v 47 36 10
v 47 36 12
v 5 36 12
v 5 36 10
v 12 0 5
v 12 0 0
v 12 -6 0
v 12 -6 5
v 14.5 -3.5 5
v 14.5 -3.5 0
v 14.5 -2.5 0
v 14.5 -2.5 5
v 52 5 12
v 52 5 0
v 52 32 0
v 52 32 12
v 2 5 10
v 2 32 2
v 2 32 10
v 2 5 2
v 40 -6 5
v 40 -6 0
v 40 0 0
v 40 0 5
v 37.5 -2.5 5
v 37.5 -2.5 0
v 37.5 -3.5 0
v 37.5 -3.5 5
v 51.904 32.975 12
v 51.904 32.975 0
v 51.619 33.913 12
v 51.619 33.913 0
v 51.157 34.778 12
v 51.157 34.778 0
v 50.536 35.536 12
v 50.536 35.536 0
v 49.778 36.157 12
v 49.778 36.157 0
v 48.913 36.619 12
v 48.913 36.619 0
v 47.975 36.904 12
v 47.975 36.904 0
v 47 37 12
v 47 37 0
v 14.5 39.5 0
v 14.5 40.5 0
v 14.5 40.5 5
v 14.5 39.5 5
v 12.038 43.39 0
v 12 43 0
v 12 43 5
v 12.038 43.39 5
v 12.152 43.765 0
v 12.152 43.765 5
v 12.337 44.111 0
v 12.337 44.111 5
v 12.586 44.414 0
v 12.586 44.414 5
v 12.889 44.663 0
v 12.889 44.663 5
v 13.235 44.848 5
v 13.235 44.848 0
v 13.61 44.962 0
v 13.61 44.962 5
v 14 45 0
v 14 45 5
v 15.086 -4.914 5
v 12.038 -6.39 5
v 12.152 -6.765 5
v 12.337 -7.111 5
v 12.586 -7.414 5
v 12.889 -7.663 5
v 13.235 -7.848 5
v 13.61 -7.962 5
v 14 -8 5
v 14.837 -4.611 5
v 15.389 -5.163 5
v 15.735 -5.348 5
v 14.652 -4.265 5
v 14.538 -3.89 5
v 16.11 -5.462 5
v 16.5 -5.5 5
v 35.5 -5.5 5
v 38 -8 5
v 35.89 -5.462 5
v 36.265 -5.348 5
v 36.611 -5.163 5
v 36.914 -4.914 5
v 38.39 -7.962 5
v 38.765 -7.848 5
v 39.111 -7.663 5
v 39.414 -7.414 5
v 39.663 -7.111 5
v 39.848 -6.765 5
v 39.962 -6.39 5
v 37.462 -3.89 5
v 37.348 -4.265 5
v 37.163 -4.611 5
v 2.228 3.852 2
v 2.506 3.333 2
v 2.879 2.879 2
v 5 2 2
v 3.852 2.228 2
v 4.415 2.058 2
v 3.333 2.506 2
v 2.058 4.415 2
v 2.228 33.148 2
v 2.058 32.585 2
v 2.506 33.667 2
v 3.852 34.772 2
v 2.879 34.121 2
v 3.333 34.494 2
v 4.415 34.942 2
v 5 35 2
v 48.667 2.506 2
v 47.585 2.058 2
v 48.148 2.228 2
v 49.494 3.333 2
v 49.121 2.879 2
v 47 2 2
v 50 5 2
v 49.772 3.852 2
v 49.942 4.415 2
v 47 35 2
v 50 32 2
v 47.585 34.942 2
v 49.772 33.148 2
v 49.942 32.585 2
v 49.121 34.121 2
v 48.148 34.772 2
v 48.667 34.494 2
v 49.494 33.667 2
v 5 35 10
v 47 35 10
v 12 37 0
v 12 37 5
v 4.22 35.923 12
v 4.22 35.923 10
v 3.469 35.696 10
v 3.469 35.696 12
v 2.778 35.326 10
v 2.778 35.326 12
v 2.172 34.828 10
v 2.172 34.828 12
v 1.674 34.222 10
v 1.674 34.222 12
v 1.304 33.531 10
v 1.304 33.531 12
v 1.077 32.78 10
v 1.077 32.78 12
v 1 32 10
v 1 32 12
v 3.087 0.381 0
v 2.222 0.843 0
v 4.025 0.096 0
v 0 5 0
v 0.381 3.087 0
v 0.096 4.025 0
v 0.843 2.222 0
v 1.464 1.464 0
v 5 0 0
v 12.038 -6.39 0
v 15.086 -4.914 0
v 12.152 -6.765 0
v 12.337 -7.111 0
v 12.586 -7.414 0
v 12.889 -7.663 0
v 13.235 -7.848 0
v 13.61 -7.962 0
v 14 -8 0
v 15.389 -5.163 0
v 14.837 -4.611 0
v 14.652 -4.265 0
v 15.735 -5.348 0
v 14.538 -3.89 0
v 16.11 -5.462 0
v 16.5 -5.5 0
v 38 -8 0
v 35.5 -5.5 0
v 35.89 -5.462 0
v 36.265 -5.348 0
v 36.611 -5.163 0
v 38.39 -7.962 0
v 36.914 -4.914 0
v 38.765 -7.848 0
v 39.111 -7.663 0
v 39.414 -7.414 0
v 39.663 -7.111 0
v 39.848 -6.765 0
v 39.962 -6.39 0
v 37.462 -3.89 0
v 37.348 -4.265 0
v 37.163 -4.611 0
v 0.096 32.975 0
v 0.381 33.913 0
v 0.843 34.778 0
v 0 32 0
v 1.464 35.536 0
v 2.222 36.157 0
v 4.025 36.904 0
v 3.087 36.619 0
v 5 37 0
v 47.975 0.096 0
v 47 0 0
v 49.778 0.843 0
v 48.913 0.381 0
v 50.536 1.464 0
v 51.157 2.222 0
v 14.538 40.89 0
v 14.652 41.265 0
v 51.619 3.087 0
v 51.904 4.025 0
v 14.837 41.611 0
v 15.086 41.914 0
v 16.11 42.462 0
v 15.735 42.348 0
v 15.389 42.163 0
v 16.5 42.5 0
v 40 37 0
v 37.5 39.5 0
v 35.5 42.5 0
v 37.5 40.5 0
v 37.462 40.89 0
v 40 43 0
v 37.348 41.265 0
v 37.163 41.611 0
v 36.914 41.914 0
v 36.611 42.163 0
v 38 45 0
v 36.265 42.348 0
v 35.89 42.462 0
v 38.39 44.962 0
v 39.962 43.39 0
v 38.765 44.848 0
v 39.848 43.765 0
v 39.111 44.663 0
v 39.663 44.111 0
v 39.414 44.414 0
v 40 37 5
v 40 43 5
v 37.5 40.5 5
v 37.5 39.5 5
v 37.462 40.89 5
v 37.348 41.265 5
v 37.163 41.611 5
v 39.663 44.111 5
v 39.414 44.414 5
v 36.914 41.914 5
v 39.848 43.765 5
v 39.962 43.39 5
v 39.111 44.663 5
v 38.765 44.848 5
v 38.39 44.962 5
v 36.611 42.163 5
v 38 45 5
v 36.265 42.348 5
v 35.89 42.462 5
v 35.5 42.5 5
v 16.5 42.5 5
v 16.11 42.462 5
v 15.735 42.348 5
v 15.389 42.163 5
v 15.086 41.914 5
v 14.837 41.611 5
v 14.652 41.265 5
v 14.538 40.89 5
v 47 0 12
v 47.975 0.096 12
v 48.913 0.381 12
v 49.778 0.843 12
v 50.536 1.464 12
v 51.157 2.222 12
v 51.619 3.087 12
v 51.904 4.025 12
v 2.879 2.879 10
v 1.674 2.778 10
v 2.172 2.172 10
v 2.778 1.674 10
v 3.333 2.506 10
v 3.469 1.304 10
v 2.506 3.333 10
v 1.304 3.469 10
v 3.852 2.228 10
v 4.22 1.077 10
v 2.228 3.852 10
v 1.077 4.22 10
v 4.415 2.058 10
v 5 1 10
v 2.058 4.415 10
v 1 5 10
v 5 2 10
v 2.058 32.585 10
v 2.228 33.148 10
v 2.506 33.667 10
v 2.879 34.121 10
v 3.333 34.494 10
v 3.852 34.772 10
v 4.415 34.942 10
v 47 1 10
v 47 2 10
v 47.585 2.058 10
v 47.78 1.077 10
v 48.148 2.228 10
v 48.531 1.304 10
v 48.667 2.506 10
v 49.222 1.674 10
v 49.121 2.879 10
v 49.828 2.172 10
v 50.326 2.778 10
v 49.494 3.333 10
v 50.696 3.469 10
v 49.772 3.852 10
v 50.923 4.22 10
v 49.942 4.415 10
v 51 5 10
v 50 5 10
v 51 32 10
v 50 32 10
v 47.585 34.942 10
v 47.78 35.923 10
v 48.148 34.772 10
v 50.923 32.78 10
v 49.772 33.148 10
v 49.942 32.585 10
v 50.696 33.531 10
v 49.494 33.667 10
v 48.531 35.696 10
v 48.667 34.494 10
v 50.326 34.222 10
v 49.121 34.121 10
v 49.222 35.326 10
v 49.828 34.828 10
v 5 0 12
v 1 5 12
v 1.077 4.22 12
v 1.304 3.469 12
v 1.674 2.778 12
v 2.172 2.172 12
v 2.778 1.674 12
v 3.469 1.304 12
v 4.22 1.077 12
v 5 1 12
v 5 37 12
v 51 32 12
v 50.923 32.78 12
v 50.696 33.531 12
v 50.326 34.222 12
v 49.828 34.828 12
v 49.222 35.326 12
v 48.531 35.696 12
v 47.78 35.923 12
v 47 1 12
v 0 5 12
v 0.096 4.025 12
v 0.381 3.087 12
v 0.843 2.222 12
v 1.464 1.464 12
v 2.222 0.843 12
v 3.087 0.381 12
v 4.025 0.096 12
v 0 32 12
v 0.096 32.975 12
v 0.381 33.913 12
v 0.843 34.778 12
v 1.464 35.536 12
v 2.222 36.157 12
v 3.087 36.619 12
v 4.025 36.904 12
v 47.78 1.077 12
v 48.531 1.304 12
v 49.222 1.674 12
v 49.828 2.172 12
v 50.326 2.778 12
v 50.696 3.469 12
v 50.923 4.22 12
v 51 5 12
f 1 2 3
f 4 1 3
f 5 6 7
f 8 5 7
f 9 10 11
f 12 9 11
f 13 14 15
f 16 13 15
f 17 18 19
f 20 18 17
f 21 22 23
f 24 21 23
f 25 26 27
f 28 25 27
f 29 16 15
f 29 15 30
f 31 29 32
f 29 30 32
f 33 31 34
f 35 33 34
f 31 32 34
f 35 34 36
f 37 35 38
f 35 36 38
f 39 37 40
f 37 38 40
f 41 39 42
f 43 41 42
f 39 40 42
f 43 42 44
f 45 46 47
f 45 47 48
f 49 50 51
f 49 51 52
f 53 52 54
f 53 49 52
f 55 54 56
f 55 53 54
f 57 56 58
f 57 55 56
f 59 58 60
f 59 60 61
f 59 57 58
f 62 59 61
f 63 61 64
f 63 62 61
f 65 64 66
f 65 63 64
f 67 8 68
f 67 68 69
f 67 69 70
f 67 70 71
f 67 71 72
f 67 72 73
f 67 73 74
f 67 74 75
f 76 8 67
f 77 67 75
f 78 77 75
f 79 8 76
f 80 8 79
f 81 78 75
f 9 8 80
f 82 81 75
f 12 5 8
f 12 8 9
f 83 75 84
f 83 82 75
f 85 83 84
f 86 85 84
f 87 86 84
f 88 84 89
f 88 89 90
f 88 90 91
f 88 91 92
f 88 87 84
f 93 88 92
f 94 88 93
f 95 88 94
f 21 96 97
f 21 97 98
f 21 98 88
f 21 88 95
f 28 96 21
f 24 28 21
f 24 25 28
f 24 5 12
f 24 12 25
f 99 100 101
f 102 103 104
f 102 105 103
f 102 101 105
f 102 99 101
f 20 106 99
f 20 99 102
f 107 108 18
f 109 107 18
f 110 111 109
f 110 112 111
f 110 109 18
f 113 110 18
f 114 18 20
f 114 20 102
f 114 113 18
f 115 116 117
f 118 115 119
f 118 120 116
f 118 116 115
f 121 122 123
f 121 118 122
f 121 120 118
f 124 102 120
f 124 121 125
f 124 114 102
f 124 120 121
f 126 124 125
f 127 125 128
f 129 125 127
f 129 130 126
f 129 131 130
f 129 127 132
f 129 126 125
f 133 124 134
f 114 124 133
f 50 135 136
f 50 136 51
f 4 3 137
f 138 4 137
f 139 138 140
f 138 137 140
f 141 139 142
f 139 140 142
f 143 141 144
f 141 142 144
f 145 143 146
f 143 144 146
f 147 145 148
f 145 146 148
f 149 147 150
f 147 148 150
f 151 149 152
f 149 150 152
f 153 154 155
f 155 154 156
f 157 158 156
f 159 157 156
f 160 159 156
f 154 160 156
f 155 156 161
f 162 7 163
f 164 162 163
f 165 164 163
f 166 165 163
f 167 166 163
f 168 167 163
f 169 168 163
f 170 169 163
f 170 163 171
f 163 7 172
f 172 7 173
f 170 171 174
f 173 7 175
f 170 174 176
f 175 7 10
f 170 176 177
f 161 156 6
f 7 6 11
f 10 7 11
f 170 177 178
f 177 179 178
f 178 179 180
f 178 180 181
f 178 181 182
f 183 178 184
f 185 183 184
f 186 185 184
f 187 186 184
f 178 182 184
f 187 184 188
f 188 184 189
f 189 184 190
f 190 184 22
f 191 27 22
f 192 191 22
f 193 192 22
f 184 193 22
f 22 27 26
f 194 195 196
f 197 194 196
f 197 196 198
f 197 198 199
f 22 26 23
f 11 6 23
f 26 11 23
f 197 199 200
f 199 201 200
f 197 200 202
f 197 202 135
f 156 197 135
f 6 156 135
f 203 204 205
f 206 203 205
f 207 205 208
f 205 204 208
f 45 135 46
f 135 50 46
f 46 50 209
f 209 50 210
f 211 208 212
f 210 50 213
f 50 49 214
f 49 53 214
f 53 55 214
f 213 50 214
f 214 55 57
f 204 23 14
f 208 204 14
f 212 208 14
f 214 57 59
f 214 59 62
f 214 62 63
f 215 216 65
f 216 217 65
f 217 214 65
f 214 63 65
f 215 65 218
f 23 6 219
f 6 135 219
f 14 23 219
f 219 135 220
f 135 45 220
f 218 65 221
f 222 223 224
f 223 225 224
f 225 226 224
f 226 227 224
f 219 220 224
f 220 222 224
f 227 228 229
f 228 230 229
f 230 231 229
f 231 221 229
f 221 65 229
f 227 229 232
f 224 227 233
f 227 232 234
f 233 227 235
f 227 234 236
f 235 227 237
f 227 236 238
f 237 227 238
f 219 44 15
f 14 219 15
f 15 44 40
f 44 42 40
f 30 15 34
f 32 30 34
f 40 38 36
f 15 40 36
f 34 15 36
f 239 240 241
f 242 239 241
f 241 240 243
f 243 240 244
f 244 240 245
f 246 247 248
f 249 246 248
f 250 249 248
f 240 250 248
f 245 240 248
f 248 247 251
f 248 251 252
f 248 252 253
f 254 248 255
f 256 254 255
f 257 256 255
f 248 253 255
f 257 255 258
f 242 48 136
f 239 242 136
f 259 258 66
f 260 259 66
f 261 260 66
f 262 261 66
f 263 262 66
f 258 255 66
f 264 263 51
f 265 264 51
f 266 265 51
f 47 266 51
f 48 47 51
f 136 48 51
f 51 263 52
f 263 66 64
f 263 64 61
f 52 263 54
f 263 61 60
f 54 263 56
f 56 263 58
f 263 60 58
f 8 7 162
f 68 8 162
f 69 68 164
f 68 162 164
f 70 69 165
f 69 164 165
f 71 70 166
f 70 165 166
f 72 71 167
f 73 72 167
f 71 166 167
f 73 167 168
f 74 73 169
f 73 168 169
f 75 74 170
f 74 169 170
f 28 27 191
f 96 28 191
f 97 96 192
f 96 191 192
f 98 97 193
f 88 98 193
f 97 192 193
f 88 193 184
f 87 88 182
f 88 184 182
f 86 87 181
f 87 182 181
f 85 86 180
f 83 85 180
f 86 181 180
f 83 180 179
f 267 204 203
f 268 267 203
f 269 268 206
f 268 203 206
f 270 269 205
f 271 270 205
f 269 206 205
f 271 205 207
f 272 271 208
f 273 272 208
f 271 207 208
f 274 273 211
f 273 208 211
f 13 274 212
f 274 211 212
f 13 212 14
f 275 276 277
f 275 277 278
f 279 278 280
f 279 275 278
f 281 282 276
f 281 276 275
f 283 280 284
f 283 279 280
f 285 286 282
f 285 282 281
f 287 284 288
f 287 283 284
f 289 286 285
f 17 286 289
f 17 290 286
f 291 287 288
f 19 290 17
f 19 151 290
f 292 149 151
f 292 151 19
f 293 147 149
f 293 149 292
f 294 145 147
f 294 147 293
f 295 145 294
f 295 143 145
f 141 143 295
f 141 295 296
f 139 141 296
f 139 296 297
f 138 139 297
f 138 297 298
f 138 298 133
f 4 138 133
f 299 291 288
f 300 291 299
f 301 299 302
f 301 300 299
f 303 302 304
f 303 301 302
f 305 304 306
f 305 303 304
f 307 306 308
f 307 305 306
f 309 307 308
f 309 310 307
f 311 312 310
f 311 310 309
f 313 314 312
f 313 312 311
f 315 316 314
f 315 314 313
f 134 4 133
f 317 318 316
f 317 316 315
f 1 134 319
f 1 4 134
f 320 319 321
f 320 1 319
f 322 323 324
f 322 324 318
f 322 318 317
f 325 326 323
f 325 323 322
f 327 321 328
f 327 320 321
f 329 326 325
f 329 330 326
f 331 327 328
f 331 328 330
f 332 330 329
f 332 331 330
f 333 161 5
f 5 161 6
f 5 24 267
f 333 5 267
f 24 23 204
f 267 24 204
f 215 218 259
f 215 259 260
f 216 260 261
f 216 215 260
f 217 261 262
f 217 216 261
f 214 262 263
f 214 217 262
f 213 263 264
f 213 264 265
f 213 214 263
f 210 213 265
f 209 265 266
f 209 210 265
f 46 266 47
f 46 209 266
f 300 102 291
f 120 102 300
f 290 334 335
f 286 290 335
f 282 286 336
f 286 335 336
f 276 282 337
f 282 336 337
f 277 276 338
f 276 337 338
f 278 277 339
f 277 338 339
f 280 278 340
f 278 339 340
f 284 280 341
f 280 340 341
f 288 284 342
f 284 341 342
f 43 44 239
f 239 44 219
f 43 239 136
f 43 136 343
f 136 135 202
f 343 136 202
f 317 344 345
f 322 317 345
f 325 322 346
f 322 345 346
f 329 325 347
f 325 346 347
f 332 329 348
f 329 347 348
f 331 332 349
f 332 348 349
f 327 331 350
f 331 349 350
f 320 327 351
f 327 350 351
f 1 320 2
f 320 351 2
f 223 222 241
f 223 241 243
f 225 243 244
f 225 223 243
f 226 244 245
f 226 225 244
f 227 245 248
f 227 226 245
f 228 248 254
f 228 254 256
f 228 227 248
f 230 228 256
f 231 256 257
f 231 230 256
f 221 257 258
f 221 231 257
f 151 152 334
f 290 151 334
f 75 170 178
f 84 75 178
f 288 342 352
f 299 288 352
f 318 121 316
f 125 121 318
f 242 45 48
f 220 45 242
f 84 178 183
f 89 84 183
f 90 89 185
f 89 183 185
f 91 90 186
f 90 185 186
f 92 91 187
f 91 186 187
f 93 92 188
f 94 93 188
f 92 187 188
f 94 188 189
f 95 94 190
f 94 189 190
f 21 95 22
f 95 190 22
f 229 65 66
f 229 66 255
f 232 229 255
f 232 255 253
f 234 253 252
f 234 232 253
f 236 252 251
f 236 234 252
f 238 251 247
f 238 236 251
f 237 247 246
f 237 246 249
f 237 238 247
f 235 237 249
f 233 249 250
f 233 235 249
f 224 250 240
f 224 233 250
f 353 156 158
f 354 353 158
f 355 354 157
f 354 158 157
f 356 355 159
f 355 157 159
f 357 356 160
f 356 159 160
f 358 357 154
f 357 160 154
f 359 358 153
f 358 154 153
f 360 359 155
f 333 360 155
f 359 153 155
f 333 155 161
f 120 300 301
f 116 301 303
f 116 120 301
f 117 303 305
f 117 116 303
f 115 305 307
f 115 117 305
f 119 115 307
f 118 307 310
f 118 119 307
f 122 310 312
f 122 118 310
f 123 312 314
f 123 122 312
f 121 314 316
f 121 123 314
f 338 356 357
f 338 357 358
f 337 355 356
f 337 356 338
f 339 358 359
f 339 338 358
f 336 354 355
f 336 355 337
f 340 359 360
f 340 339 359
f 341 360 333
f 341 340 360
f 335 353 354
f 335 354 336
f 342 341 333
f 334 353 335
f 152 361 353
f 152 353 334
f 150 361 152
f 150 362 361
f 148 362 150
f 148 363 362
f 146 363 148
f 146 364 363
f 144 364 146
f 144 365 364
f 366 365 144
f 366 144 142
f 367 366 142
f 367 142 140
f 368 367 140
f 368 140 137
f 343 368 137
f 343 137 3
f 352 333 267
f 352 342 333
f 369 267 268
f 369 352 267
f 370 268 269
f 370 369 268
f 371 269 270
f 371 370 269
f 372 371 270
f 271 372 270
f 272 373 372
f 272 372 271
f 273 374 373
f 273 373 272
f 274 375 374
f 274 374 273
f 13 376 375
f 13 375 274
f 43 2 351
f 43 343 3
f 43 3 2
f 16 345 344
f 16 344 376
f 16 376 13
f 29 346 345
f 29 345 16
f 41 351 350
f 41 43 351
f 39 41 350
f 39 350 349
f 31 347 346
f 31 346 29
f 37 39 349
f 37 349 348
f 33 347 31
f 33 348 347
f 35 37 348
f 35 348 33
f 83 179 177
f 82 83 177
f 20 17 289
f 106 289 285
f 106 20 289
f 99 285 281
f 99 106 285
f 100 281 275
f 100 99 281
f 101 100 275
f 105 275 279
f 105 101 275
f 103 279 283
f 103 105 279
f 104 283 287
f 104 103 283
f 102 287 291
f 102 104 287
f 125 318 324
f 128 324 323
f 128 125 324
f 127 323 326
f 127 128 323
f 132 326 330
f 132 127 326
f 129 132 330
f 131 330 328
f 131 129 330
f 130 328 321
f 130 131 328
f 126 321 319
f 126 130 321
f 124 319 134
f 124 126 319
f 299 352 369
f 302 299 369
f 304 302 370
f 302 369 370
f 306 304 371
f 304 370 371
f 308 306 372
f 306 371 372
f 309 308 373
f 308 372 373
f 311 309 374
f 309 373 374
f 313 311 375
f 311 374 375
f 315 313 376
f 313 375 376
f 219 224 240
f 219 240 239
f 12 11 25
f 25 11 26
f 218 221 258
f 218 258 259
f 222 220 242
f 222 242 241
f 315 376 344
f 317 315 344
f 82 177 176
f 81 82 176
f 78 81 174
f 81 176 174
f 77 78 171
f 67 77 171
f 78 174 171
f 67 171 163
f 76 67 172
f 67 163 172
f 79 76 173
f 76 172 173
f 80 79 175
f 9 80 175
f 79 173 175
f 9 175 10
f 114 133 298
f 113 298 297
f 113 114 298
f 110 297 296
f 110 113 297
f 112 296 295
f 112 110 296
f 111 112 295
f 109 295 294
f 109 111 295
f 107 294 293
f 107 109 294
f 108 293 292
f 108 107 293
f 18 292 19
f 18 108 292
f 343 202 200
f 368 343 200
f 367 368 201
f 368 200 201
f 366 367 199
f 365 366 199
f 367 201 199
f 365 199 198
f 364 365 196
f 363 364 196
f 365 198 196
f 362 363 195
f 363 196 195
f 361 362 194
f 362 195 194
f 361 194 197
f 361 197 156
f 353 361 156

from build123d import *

# Parameters (mm, degrees)
BOSS_EXTRU_1_DEPTH      = 12
COQUE5_T                = -2
ENL_V_MAT_EXTRU_1_DEPTH = 2
BOSS_EXTRU_5_DEPTH      = 5


with BuildPart() as part:
    # Esquisse1 → Boss.-Extru.1 (new body)
    with BuildSketch(Plane.XY):
        with BuildLine():
            Line((5, 0), (47, 0))
            ThreePointArc((47, 0), (50.535533906, 1.464466094), (52, 5))
            Line((52, 5), (52, 32))
            ThreePointArc((52, 32), (50.535533906, 35.535533906), (47, 37))
            Line((47, 37), (5, 37))
            ThreePointArc((5, 37), (1.464466094, 35.535533906), (0, 32))
            Line((0, 32), (0, 5))
            ThreePointArc((0, 5), (1.464466094, 1.464466094), (5, 0))
        make_face()
    extrude(amount=BOSS_EXTRU_1_DEPTH)

    # Coque5
    coque5_openings = [part.faces().sort_by_distance(p)[0] for p in [
        (26, 18.5, 12),
    ]]
    offset(amount=COQUE5_T, openings=coque5_openings, kind=Kind.INTERSECTION)

    # Esquisse3 → Enlèv. mat.-Extru.1 (cut)
    with BuildSketch(Plane.XY.offset(12)):
        with BuildLine():
            ThreePointArc((51, 32), (49.828427125, 34.828427125), (47, 36))
            Line((47, 36), (5, 36))
            ThreePointArc((5, 36), (2.171572875, 34.828427125), (1, 32))
            Line((1, 32), (1, 5))
            ThreePointArc((1, 5), (2.171572875, 2.171572875), (5, 1))
            Line((5, 1), (47, 1))
            ThreePointArc((47, 1), (49.828427125, 2.171572875), (51, 5))
            Line((51, 5), (51, 32))
        make_face()
    extrude(amount=-ENL_V_MAT_EXTRU_1_DEPTH, mode=Mode.SUBTRACT)

    # Esquisse10 → Boss.-Extru.5 (add)
    # profile 1 of 2: a face of its own
    with BuildSketch(Plane(origin=(0, 0, 0), x_dir=(-1, 0, 0), z_dir=(0, 0, -1))):
        with BuildLine():
            Line((-40, 37), (-12, 37))
            Line((-12, 37), (-12, 43))
            ThreePointArc((-12, 43), (-12.585786438, 44.414213562), (-14, 45))
            Line((-14, 45), (-38, 45))
            ThreePointArc((-38, 45), (-39.414213562, 44.414213562), (-40, 43))
            Line((-40, 43), (-40, 37))
        make_face()
        with BuildLine():
            Line((-37.5, 39.5), (-37.5, 40.5))
            ThreePointArc((-37.5, 40.5), (-36.914213562, 41.914213562), (-35.5, 42.5))
            Line((-35.5, 42.5), (-16.5, 42.5))
            ThreePointArc((-16.5, 42.5), (-15.085786438, 41.914213562), (-14.5, 40.5))
            Line((-14.5, 40.5), (-14.5, 39.5))
            Line((-14.5, 39.5), (-37.5, 39.5))
        make_face(mode=Mode.SUBTRACT)
    # profile 2 of 2: a face of its own
    with BuildSketch(Plane(origin=(0, 0, 0), x_dir=(-1, 0, 0), z_dir=(0, 0, -1))):
        with BuildLine():
            Line((-40, 0), (-12, 0))
            Line((-12, 0), (-12, -6))
            ThreePointArc((-12, -6), (-12.585786438, -7.414213562), (-14, -8))
            Line((-14, -8), (-38, -8))
            ThreePointArc((-38, -8), (-39.414213562, -7.414213562), (-40, -6))
            Line((-40, -6), (-40, 0))
        make_face()
        with BuildLine():
            Line((-37.5, -2.5), (-37.5, -3.5))
            ThreePointArc((-37.5, -3.5), (-36.914213562, -4.914213562), (-35.5, -5.5))
            Line((-35.5, -5.5), (-16.5, -5.5))
            ThreePointArc((-16.5, -5.5), (-15.085786438, -4.914213562), (-14.5, -3.5))
            Line((-14.5, -3.5), (-14.5, -2.5))
            Line((-14.5, -2.5), (-37.5, -2.5))
        make_face(mode=Mode.SUBTRACT)
    extrude(amount=-BOSS_EXTRU_5_DEPTH)


solid = part.part
